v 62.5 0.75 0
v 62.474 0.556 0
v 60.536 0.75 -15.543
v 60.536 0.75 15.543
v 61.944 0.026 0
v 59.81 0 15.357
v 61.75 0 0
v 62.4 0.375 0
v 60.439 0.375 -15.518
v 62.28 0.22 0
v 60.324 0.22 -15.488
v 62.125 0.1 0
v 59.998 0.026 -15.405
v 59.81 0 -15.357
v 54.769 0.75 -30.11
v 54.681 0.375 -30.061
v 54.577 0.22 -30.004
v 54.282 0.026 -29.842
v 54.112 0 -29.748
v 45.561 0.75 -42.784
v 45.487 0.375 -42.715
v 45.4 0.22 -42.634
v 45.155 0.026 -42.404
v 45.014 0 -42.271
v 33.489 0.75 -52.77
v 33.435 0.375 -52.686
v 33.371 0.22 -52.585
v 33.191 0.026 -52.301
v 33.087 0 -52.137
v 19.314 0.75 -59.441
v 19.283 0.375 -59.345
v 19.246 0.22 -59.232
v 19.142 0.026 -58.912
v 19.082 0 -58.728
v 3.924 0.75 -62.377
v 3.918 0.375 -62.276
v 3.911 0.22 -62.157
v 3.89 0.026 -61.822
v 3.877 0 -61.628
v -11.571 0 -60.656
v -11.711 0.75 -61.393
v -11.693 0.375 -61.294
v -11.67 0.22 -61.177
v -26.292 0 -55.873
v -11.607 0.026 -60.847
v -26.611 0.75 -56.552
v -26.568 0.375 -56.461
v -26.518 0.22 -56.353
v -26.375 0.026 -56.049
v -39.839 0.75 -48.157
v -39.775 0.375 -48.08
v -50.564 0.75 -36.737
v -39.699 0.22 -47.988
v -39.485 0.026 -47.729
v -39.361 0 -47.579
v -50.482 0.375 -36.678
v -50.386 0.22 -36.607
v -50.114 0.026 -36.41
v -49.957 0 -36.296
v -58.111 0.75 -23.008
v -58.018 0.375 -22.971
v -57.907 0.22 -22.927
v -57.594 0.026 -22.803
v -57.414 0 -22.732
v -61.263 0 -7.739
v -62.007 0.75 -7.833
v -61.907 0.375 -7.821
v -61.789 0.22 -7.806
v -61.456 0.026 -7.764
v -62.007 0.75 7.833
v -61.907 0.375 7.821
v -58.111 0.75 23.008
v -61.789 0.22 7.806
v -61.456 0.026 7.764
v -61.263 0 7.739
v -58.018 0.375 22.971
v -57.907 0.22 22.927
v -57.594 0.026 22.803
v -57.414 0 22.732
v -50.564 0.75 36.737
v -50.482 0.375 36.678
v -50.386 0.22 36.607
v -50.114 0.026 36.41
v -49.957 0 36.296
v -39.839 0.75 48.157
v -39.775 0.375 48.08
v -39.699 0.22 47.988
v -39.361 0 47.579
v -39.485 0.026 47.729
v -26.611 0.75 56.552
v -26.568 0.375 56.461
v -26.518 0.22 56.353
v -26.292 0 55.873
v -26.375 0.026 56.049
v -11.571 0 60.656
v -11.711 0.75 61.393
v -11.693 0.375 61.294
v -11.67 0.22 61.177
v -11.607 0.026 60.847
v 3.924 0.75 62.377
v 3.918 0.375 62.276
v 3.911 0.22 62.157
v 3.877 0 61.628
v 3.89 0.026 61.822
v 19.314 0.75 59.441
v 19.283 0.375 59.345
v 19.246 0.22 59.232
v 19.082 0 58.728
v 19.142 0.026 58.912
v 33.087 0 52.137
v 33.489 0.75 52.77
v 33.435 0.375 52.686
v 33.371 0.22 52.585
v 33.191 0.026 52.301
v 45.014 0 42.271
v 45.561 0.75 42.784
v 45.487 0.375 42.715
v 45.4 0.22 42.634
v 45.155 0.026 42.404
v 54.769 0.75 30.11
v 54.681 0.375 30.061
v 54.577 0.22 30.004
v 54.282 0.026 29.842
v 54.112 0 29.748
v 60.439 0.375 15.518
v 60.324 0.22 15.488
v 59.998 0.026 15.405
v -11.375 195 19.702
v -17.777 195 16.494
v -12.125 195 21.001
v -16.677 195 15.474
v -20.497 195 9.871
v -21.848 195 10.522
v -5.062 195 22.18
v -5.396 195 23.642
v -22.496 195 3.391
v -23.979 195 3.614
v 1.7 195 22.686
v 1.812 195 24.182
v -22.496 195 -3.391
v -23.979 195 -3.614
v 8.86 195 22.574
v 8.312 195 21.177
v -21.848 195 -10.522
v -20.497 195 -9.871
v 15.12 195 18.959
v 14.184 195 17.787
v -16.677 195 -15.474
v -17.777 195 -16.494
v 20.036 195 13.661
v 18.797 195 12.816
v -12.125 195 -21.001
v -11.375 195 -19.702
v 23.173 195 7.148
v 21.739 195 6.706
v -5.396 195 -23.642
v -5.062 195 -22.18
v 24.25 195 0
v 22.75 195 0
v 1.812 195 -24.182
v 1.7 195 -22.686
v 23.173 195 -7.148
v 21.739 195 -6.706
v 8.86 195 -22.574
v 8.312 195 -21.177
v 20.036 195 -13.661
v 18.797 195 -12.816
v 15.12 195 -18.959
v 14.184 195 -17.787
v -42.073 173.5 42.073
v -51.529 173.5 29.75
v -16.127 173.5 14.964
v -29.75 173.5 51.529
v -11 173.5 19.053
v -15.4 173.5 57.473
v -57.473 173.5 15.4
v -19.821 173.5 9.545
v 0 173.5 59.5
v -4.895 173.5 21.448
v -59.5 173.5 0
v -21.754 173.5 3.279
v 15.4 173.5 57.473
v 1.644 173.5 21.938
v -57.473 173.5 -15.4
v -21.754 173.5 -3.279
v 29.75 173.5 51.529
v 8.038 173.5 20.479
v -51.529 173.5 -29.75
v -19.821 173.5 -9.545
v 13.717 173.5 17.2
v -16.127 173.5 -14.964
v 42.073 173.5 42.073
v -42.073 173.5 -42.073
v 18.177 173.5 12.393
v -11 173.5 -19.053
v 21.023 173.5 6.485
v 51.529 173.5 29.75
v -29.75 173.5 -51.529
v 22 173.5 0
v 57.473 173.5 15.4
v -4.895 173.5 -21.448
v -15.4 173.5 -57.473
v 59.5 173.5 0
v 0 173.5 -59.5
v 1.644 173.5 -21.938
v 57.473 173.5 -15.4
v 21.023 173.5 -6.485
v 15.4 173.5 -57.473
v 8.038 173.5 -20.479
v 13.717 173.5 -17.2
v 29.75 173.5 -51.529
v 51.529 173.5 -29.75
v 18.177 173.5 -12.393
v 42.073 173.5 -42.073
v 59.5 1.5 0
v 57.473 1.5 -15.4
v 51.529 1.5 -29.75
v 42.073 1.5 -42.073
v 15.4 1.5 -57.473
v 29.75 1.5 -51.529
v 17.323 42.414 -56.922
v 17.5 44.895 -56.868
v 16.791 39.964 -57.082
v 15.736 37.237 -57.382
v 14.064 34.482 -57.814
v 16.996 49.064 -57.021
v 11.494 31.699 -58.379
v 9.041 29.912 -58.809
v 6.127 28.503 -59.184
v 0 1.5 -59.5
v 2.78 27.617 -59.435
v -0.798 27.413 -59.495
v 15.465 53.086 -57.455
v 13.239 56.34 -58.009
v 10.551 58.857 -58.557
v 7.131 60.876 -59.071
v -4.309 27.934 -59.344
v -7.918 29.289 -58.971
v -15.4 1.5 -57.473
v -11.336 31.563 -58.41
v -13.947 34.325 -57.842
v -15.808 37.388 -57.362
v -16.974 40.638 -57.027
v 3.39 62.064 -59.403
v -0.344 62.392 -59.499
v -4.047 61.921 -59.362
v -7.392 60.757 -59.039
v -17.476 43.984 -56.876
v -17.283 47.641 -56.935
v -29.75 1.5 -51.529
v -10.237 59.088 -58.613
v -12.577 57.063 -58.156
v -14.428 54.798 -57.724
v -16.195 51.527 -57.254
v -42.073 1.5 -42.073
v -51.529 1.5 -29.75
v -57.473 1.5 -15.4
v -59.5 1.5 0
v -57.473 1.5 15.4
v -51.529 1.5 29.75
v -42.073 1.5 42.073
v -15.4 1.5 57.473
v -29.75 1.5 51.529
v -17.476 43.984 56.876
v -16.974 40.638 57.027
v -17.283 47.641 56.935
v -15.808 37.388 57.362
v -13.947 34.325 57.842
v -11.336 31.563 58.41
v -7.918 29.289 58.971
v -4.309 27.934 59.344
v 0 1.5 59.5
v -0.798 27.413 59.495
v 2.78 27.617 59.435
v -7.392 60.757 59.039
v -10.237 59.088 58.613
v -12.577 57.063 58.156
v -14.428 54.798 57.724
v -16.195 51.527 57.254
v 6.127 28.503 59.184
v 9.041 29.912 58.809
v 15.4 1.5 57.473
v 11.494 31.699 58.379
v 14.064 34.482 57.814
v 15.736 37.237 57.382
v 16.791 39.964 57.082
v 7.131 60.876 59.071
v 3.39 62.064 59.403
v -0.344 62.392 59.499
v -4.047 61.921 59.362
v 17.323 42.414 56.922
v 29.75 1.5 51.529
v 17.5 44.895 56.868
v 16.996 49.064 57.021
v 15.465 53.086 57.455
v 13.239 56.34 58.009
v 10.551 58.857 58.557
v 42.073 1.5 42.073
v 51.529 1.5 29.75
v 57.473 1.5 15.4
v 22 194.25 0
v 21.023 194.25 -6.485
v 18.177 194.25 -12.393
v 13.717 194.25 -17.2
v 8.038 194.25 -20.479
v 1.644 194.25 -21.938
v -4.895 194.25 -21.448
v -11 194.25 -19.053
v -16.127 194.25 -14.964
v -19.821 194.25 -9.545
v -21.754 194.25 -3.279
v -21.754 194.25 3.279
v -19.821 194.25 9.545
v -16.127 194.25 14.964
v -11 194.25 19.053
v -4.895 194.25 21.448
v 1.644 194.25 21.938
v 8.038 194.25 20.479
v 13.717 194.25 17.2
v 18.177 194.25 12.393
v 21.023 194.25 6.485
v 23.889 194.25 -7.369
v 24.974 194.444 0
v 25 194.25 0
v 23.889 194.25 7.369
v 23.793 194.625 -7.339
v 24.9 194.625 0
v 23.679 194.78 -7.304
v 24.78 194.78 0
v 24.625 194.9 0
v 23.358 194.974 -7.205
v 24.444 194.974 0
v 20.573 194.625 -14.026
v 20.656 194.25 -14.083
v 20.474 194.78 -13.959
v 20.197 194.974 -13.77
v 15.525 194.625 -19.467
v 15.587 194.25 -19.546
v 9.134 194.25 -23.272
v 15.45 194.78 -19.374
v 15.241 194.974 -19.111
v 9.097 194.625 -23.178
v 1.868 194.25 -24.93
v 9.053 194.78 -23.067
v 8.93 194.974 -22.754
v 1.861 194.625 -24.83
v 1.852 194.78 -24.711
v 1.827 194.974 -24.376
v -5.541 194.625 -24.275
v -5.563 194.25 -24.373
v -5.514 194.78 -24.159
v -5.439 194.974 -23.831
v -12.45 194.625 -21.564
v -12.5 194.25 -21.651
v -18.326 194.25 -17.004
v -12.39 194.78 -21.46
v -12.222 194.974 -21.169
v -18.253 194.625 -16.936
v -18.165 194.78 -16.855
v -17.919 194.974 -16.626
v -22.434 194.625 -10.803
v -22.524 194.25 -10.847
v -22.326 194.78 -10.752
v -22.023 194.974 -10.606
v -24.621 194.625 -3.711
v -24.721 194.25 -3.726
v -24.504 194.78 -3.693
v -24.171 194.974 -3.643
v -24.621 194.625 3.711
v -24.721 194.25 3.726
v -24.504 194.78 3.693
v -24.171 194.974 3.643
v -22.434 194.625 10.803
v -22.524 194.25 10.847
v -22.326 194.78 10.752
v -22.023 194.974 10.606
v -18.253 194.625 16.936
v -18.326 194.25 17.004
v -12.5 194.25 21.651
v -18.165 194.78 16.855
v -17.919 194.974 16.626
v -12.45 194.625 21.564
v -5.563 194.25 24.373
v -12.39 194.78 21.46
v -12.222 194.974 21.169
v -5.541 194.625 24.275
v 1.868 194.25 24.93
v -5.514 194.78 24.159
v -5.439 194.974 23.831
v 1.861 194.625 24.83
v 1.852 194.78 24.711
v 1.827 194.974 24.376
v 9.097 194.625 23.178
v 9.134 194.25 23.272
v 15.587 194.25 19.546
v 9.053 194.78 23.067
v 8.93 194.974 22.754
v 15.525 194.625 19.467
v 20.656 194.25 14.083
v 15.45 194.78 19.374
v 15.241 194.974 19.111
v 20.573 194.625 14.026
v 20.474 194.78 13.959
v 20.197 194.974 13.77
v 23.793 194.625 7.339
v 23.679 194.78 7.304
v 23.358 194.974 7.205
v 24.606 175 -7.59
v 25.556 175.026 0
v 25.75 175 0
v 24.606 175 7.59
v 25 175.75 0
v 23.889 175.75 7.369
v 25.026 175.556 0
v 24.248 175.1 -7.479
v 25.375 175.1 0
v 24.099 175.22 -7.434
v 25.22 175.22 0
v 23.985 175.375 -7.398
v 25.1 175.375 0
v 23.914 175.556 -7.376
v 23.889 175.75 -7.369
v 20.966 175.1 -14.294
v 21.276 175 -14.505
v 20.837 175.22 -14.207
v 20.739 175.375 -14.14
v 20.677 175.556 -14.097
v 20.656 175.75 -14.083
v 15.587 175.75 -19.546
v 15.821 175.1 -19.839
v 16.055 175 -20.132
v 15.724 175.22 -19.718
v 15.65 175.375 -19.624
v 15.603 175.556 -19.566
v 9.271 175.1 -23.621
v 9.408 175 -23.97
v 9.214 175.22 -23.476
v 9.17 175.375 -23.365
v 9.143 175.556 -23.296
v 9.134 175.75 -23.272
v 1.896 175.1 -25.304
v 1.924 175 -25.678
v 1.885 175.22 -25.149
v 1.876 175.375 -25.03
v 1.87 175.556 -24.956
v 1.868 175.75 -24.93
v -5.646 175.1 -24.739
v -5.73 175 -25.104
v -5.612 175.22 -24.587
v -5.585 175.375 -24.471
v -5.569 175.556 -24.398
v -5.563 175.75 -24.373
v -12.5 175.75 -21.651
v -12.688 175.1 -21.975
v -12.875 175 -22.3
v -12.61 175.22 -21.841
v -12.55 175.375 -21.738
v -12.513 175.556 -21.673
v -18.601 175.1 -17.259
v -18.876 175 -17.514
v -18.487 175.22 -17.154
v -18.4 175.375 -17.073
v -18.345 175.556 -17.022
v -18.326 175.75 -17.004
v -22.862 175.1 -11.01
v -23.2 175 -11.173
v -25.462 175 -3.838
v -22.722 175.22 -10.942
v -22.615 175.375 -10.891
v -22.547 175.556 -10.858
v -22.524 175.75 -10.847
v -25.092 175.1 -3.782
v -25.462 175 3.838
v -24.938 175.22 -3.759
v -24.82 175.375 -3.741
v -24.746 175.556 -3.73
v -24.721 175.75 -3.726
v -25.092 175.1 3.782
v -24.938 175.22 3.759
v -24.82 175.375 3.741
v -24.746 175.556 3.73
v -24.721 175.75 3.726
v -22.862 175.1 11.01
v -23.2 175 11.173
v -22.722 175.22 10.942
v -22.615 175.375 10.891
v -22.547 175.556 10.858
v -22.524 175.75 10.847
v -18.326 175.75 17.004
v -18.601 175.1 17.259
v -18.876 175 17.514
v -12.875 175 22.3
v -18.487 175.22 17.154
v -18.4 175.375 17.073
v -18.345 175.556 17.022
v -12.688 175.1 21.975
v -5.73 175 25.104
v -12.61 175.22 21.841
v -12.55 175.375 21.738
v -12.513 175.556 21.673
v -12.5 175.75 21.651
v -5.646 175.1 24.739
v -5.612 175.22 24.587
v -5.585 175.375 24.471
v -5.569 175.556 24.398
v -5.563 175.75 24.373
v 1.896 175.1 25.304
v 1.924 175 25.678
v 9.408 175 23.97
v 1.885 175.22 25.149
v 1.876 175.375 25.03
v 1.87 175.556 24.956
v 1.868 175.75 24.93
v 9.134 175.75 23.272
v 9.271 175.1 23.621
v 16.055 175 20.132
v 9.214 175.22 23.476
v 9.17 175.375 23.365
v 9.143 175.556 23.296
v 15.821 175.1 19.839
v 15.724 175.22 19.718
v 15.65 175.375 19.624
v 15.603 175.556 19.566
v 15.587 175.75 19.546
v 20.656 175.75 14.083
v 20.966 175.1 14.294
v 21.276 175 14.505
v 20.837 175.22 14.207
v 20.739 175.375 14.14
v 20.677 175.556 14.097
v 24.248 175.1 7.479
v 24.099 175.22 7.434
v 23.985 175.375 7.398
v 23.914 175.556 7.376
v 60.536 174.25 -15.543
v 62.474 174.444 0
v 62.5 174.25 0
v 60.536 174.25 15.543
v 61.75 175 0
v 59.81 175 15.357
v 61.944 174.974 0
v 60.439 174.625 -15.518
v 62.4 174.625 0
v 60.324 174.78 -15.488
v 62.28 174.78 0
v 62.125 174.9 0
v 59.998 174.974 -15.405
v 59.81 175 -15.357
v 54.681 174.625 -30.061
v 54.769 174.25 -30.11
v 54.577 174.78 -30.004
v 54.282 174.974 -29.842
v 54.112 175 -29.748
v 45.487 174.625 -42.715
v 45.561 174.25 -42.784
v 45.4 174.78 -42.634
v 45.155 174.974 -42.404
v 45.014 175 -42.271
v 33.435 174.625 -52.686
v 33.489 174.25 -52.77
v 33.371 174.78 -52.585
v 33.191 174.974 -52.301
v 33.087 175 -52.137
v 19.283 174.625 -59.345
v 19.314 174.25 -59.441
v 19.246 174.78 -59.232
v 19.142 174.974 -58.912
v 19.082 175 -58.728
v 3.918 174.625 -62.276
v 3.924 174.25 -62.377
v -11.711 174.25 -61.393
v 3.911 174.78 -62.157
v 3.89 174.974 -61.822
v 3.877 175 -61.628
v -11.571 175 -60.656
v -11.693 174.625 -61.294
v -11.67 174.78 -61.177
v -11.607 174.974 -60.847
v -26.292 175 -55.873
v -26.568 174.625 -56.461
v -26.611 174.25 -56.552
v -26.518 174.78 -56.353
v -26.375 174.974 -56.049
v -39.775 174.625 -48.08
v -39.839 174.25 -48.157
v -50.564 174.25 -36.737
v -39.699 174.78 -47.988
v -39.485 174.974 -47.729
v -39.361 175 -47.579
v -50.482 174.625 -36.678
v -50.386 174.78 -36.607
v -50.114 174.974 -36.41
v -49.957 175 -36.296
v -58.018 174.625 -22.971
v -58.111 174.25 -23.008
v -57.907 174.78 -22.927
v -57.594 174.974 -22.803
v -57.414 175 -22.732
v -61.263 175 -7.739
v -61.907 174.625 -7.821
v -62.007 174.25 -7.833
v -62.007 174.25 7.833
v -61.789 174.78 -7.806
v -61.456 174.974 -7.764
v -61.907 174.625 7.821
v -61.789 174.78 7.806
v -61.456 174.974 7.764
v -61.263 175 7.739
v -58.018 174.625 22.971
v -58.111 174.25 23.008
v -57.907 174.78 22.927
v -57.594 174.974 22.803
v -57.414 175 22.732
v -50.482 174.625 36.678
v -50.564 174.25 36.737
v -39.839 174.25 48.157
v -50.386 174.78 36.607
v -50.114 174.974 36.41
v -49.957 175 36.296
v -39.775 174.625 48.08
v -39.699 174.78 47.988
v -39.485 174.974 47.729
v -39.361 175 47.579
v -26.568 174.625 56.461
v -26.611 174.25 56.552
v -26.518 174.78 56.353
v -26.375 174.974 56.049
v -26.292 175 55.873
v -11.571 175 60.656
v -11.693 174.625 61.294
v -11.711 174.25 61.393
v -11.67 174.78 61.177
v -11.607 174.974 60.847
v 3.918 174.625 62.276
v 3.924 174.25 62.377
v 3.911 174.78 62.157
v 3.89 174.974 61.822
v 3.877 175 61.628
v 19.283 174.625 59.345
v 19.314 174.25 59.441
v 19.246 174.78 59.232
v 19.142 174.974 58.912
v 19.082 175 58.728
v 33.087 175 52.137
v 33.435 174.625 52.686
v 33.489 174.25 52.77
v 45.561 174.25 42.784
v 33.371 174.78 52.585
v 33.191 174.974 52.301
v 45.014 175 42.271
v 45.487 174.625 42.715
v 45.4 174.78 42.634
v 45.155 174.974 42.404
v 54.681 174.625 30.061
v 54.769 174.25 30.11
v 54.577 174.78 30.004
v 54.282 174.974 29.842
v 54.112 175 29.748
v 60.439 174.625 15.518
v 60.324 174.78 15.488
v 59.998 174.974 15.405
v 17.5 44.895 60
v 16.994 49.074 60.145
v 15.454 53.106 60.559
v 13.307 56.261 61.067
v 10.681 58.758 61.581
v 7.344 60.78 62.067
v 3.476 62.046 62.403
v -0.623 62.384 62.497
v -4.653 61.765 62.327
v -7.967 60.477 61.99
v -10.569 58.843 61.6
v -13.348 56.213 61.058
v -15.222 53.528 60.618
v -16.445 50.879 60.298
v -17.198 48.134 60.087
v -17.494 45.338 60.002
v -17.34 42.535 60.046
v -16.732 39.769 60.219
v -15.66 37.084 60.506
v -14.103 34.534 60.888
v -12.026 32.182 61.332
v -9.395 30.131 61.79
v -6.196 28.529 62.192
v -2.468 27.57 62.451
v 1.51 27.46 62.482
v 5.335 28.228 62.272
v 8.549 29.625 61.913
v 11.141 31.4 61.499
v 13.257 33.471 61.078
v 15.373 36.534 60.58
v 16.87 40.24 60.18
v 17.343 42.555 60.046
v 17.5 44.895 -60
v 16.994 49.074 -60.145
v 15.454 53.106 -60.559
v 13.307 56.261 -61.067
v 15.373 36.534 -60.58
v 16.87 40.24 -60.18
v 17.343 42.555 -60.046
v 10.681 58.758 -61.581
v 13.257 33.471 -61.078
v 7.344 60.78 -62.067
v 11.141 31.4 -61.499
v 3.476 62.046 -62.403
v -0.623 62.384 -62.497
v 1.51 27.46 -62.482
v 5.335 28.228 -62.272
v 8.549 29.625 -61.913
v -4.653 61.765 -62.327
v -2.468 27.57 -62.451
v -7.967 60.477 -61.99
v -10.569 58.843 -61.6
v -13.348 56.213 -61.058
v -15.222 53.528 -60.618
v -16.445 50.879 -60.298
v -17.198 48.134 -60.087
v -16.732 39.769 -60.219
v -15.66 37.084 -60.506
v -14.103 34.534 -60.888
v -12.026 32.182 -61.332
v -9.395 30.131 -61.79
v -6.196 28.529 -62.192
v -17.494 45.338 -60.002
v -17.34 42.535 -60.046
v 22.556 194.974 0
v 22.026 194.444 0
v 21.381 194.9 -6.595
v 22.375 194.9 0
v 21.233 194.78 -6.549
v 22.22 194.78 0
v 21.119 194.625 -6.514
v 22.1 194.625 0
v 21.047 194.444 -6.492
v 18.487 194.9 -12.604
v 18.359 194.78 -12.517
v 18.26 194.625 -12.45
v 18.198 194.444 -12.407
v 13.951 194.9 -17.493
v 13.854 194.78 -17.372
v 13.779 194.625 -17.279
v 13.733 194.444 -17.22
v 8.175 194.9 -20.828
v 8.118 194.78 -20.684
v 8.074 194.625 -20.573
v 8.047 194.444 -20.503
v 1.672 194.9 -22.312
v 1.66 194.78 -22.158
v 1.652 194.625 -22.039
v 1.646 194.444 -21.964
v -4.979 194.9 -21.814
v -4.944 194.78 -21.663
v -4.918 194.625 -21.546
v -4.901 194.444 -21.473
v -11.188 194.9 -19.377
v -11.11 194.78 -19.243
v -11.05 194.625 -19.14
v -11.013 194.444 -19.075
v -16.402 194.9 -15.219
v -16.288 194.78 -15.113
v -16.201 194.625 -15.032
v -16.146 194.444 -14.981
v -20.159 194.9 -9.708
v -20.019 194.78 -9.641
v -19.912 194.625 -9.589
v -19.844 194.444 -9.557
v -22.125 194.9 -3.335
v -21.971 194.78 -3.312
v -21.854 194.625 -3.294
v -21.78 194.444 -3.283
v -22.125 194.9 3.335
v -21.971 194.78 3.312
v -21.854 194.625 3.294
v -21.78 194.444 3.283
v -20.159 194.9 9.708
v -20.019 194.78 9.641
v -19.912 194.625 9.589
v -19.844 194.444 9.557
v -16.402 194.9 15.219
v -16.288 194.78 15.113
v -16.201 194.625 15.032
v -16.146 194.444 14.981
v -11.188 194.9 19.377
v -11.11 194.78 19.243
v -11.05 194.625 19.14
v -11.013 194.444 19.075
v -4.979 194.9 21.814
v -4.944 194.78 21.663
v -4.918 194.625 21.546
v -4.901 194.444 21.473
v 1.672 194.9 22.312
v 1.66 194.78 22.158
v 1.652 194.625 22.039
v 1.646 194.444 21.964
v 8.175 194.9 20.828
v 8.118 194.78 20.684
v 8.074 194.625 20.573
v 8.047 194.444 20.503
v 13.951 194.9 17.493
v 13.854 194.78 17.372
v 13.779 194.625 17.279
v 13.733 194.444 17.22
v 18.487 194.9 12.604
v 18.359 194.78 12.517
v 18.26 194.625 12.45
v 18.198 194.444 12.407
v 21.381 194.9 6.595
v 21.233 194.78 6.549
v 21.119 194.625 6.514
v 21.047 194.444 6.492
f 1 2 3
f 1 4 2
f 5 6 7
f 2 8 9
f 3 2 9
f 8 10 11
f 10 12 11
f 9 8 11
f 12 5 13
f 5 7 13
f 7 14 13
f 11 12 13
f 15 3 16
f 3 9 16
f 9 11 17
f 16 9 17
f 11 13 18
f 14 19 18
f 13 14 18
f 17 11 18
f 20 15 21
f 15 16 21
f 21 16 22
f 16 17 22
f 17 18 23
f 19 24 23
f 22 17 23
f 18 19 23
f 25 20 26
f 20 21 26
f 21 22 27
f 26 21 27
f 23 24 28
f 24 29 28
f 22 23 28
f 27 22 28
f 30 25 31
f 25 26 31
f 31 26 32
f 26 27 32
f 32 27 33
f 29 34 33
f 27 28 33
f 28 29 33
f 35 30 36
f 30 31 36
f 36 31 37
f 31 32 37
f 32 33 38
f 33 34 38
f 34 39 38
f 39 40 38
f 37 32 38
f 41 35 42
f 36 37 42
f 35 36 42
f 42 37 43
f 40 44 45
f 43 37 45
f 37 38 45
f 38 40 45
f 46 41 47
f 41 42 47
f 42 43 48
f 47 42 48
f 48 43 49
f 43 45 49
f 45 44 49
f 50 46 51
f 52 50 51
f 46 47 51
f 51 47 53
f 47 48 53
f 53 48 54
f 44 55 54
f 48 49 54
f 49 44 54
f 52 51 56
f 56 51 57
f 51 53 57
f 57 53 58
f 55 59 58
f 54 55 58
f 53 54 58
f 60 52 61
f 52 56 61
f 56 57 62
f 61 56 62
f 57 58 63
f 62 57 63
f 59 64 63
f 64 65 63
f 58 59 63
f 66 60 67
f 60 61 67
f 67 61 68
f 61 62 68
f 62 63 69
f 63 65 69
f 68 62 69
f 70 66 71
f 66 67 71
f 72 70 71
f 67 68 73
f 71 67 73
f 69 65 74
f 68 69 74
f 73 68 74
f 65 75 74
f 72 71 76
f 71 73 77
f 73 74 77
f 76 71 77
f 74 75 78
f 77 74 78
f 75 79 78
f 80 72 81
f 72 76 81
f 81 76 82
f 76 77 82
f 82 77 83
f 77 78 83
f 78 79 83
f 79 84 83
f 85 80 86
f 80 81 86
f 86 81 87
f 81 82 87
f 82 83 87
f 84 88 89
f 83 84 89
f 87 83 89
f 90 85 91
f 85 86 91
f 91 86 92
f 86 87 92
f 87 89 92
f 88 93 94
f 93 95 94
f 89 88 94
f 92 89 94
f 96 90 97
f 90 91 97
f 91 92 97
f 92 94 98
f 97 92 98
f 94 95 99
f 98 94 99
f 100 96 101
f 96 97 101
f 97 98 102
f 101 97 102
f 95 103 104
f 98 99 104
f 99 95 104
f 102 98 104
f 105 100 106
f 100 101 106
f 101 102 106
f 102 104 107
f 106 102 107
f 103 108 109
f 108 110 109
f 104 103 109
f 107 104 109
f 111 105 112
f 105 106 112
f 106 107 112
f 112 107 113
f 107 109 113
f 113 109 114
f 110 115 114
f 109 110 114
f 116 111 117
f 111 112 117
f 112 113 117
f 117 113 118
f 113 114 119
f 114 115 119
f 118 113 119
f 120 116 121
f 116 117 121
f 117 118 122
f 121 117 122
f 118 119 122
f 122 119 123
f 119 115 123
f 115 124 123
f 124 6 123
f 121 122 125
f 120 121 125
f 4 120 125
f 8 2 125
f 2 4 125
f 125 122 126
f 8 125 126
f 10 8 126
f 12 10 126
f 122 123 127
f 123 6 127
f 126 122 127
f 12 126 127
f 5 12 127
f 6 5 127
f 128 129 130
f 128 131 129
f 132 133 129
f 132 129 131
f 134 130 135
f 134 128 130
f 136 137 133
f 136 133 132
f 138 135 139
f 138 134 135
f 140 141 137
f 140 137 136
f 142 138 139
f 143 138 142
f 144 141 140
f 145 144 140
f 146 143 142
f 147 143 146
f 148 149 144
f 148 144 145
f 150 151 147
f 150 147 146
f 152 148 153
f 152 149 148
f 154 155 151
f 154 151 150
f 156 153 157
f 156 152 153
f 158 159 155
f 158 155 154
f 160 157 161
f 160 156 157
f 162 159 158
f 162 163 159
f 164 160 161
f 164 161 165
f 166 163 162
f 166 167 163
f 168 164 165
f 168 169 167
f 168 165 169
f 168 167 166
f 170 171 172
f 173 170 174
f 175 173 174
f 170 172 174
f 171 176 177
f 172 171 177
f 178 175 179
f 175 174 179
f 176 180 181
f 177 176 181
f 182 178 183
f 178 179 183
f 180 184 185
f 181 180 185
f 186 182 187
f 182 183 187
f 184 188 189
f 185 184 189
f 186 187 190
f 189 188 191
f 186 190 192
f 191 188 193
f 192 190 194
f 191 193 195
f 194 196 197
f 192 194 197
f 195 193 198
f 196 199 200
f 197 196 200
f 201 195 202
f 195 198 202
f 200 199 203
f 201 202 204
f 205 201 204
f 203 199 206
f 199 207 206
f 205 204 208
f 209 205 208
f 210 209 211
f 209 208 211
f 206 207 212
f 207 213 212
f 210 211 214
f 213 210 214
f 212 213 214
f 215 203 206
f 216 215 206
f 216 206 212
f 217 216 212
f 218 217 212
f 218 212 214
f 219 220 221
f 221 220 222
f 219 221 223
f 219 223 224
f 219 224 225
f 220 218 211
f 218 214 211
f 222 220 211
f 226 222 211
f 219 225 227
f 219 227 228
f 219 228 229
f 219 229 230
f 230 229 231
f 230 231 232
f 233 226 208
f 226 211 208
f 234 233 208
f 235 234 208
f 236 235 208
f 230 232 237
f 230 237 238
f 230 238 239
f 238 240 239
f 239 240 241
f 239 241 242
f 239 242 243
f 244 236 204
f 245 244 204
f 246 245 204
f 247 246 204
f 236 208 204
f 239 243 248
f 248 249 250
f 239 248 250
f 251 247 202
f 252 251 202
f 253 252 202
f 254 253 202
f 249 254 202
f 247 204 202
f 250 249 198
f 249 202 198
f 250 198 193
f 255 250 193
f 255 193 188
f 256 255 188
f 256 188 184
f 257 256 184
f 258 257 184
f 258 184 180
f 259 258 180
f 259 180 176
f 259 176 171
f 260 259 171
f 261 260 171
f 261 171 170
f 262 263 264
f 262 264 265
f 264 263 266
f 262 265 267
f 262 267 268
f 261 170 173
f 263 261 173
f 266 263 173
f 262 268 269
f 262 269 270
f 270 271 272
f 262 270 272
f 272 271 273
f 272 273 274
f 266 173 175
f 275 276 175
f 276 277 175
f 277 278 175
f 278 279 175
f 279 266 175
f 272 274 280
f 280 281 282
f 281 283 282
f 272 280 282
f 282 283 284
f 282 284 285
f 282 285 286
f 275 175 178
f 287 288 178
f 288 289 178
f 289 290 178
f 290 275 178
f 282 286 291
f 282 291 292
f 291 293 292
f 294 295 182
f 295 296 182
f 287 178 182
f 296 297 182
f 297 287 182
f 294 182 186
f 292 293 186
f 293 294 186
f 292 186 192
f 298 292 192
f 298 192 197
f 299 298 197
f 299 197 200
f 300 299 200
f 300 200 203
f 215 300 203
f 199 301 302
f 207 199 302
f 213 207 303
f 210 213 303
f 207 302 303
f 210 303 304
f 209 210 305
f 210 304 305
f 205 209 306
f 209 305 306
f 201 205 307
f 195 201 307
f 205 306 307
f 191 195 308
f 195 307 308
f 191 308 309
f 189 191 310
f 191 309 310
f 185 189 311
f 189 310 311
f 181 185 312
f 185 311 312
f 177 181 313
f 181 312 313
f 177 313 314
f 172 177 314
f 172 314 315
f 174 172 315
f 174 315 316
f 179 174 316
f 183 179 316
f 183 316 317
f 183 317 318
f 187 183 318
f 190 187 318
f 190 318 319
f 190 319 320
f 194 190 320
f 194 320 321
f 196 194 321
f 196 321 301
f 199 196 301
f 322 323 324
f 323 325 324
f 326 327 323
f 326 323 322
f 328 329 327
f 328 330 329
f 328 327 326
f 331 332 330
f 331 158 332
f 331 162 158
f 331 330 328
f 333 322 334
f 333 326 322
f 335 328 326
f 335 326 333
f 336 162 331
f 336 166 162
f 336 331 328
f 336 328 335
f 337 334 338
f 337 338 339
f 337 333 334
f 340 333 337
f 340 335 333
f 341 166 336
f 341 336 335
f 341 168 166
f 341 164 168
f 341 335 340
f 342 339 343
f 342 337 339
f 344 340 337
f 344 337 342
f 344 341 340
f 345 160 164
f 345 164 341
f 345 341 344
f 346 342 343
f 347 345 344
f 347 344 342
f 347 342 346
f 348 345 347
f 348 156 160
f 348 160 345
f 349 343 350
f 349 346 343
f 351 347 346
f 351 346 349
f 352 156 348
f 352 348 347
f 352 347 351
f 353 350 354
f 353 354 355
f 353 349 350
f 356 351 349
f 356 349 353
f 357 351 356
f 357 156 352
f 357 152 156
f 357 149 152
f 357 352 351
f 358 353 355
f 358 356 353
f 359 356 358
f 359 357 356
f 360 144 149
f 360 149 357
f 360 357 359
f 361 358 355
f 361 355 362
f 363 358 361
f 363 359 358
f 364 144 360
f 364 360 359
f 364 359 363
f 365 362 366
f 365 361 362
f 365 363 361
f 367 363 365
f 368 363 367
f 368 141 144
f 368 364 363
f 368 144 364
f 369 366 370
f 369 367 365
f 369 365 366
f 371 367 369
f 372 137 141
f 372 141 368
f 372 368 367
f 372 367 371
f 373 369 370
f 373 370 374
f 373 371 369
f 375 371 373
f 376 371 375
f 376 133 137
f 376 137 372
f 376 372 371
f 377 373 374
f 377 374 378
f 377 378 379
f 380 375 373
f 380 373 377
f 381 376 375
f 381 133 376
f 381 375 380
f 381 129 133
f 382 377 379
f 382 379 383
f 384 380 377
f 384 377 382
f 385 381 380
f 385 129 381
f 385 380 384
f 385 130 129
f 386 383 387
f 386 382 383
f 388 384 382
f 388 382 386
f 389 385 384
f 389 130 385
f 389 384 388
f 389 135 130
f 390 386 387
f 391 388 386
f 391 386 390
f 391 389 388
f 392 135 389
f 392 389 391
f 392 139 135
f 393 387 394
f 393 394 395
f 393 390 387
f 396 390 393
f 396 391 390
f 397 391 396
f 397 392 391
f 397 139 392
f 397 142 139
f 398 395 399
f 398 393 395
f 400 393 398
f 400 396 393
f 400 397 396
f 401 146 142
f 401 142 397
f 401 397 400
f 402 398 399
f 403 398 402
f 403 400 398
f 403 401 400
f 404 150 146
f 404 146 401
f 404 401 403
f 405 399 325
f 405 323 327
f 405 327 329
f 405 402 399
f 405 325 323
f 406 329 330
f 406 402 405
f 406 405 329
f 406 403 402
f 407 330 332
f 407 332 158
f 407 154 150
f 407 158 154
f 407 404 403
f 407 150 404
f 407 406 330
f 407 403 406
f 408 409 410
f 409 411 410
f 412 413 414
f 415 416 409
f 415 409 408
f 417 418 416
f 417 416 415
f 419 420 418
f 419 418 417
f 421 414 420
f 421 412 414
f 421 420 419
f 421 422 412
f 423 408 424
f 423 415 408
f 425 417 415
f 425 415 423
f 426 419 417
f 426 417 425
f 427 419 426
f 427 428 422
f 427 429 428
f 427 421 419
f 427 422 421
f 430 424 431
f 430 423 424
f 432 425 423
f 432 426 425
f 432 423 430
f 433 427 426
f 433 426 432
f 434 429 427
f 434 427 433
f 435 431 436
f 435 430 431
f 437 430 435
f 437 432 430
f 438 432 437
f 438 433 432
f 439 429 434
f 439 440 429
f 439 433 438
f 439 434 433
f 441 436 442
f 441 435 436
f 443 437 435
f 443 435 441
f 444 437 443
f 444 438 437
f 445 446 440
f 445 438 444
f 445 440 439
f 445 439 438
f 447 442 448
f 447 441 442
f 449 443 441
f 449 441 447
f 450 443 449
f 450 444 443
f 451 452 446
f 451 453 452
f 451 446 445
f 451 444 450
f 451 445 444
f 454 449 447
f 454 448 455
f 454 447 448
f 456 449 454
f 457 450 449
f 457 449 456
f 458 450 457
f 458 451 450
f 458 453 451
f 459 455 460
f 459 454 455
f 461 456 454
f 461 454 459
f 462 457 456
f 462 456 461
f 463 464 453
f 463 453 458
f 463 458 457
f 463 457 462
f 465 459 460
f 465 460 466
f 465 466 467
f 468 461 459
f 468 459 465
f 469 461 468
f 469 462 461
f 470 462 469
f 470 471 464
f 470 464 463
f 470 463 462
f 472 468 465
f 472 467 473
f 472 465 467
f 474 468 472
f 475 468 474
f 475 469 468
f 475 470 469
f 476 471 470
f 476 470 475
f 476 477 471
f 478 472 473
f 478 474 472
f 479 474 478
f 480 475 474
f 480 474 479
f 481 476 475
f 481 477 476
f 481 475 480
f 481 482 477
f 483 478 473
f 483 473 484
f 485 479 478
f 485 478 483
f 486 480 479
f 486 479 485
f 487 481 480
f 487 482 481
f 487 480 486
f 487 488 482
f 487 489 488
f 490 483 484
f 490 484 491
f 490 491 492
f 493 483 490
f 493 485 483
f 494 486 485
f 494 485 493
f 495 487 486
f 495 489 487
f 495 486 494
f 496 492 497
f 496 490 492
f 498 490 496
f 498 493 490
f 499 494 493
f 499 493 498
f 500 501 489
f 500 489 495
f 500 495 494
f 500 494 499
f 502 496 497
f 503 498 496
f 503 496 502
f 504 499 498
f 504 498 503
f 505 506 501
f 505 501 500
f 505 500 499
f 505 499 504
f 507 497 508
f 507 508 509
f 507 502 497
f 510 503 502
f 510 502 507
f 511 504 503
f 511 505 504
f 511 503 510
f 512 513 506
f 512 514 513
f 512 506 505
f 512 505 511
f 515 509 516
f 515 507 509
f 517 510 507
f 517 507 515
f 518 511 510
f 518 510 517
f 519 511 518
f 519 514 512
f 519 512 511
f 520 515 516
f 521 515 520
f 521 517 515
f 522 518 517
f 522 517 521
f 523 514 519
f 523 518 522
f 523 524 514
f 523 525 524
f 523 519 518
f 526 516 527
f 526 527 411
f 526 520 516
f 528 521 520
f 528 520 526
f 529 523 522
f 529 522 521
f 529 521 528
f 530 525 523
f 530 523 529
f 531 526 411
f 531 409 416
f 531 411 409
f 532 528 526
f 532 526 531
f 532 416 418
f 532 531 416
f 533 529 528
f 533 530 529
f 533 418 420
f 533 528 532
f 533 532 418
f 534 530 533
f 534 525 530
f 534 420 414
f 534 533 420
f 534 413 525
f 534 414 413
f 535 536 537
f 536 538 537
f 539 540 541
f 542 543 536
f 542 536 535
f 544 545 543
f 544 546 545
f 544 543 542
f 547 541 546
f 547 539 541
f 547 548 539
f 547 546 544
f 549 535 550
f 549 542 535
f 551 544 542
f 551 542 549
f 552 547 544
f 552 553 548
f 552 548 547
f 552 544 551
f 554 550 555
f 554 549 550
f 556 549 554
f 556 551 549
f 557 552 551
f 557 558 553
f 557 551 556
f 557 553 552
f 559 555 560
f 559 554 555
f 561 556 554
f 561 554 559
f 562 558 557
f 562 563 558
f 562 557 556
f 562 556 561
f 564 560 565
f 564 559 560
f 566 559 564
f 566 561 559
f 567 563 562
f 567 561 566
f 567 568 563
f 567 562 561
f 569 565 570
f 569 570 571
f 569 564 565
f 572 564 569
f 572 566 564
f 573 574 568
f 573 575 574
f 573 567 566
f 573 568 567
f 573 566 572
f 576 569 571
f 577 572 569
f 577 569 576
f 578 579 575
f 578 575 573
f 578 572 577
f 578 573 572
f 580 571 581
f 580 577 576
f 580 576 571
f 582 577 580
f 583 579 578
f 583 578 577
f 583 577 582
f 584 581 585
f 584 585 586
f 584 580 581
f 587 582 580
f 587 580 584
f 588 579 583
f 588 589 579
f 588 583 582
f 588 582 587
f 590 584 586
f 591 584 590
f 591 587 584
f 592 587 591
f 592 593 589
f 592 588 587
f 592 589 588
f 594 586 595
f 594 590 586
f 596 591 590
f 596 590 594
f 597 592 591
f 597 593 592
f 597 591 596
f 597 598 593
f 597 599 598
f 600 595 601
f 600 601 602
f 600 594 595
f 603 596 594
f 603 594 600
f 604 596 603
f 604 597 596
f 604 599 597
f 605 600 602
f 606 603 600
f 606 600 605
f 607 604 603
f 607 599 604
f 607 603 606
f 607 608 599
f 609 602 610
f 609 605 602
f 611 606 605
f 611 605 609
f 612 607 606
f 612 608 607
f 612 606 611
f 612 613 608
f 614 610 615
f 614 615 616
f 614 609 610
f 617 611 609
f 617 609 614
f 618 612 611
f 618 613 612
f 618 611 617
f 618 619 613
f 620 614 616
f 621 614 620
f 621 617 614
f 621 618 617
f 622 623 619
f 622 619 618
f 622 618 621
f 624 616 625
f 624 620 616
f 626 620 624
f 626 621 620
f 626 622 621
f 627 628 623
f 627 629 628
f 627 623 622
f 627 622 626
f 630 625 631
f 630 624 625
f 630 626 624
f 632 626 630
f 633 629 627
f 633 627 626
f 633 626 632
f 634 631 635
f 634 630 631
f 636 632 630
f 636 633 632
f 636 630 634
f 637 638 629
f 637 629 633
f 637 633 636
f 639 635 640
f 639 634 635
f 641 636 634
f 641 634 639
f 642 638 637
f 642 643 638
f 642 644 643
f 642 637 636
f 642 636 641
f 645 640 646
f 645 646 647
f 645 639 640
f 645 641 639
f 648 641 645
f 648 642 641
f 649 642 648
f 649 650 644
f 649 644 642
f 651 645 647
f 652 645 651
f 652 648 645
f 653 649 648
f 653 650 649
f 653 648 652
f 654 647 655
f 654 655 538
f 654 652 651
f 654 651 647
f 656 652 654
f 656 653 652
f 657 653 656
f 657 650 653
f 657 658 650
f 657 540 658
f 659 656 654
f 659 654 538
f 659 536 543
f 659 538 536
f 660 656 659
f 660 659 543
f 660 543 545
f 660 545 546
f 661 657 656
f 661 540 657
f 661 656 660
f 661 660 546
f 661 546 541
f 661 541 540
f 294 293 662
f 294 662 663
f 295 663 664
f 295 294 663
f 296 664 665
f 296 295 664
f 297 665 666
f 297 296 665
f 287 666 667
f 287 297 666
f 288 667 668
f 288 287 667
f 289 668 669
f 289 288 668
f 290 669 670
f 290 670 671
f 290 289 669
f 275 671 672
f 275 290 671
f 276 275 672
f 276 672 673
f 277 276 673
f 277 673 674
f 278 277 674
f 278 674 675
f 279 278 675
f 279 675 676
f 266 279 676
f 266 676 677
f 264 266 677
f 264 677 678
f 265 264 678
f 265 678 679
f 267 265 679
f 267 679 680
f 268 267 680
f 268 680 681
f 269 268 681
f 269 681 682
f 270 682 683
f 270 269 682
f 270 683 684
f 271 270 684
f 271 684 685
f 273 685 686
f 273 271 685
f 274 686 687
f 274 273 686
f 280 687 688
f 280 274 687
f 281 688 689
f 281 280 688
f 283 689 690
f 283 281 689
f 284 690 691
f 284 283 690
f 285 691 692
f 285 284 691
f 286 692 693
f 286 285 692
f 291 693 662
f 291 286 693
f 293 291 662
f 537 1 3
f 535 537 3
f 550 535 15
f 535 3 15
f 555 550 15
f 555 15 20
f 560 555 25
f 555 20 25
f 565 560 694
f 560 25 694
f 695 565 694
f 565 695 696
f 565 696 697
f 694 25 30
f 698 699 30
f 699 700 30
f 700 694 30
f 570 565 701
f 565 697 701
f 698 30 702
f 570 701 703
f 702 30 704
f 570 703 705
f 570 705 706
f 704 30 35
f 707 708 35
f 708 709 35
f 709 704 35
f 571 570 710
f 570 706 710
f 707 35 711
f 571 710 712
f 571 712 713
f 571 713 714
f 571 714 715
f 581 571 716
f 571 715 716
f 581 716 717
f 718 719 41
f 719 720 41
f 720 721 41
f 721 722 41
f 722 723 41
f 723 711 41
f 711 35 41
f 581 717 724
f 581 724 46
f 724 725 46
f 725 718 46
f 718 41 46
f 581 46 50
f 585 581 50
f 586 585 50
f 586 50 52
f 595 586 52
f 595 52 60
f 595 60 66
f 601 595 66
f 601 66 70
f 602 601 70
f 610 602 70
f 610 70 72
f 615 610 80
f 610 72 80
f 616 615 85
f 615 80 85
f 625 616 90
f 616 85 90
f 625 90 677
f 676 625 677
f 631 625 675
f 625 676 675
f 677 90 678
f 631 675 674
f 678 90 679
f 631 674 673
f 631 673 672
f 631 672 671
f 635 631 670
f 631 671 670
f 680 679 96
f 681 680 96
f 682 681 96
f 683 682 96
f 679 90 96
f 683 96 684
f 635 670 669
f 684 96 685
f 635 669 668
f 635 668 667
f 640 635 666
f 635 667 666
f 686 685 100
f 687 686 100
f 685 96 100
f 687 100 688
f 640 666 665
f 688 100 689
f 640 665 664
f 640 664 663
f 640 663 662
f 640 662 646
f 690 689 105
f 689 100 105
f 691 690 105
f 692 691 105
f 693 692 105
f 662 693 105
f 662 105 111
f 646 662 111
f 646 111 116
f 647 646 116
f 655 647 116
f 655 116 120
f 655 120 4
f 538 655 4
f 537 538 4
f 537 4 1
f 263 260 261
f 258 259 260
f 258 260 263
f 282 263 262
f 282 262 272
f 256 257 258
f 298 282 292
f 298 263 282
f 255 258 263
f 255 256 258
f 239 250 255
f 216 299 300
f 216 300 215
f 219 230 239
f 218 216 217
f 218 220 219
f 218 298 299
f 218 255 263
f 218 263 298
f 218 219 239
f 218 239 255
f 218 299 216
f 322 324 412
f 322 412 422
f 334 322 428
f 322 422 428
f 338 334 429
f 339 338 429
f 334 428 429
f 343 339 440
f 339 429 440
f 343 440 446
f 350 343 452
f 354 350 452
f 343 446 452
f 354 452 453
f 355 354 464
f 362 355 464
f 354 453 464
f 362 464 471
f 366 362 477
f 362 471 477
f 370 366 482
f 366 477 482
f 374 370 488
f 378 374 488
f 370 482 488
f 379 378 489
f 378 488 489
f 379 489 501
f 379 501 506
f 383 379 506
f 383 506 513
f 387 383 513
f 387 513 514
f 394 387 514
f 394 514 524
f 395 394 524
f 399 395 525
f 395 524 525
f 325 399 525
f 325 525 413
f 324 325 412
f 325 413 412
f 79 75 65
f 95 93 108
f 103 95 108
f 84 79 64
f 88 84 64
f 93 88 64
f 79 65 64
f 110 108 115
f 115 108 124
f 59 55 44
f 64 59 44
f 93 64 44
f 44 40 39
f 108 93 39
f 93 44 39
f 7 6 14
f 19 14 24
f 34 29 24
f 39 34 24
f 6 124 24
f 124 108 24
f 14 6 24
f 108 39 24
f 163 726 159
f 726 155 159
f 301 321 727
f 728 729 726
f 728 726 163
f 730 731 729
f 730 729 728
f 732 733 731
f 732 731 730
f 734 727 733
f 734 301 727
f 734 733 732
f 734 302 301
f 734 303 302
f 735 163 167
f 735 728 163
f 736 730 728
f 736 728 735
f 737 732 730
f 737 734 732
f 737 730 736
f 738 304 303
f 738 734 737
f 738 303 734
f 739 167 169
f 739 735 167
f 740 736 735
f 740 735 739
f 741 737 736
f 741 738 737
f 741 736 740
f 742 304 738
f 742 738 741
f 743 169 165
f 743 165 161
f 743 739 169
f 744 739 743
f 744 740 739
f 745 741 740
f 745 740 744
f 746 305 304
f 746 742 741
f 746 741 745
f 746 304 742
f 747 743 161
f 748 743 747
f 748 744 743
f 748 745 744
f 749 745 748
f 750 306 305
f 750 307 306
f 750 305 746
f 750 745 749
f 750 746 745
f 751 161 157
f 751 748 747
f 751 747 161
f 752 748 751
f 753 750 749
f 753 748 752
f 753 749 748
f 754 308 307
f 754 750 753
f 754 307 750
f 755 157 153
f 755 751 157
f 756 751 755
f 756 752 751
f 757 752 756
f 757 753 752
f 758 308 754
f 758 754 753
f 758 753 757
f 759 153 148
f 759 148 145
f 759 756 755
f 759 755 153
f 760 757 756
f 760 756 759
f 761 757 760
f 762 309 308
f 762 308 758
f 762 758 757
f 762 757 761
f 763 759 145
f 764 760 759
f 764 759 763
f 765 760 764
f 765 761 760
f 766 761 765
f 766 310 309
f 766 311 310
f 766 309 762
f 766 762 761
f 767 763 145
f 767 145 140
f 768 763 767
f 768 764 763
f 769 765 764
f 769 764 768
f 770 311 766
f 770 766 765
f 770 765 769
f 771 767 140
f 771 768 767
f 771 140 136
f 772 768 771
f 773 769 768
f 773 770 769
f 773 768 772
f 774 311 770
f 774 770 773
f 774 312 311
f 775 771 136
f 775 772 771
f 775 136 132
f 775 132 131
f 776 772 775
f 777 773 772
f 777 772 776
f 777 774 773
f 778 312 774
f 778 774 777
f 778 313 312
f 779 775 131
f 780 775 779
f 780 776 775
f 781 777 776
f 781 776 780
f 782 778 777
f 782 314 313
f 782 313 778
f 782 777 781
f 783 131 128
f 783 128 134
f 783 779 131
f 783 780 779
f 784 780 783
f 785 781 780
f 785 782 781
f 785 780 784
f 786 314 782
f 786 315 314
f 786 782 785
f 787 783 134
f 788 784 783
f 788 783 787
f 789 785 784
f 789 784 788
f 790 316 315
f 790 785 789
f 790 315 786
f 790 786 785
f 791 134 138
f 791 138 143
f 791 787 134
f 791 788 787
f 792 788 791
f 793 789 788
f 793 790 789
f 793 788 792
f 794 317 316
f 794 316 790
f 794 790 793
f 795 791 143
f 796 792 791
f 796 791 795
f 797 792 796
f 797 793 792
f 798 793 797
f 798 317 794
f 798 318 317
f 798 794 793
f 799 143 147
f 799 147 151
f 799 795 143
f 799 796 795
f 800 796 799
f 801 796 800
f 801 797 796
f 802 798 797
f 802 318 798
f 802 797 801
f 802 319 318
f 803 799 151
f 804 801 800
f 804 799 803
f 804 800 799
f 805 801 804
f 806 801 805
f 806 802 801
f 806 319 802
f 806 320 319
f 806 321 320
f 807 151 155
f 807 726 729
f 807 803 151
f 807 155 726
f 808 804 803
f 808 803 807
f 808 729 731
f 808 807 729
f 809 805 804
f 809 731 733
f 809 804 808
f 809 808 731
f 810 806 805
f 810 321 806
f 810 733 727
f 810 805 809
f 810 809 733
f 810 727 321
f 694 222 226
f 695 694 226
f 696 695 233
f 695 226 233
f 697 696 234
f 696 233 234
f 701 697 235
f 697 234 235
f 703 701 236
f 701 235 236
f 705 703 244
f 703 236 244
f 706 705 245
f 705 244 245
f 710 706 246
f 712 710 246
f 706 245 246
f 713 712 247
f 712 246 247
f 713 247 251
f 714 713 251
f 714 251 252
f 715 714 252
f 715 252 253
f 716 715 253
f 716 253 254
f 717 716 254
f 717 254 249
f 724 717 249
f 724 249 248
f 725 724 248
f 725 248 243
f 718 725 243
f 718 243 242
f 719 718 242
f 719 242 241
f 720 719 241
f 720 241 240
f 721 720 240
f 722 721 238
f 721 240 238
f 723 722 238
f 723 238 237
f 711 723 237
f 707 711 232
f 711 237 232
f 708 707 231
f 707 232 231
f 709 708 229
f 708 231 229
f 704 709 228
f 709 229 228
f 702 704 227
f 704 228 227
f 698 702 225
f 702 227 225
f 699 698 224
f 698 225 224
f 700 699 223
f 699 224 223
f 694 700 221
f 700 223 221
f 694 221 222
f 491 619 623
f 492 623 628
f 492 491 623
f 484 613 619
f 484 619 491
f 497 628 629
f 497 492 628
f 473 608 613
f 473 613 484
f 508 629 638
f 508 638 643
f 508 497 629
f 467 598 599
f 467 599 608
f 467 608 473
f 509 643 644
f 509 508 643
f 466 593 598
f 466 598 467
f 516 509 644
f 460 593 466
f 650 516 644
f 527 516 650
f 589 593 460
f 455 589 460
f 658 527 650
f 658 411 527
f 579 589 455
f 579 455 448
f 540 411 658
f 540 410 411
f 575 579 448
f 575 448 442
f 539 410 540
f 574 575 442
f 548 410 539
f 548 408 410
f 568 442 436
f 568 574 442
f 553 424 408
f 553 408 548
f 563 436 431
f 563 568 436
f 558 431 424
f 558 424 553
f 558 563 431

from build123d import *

# Parameters (mm, degrees)
SKETCH1_R               = 62.5
BOSS_EXTRUDE1_DEPTH     = 175
CUT_EXTRUDE1_START      = -1.5
SKETCH2_R               = 59.5
CUT_EXTRUDE1_DEPTH      = 172
SKETCH3_R               = 25
BOSS_EXTRUDE2_DEPTH     = 20
SKETCH4_R               = 22
CUT_EXTRUDE2_DEPTH      = 30
FILLET1_R               = 0.75
SKETCH5_R               = 17.5
CUT_EXTRUDE3_DEPTH      = 63.5000001
CUT_EXTRUDE3_DEPTH_BACK = 70


with BuildPart() as part:
    # Sketch1 → Boss-Extrude1 (new body)
    with BuildSketch(Plane(origin=(0, 0, 0), x_dir=(1, 0, 0), z_dir=(0, 1, 0))):
        Circle(SKETCH1_R)
    extrude(amount=BOSS_EXTRUDE1_DEPTH)

    # Sketch2 → Cut-Extrude1 (cut)
    with BuildSketch(Plane(origin=(0, 175, 0), x_dir=(1, 0, 0), z_dir=(0, 1, 0)).offset(CUT_EXTRUDE1_START)):
        Circle(SKETCH2_R)
    extrude(amount=-CUT_EXTRUDE1_DEPTH, mode=Mode.SUBTRACT)

    # Sketch3 → Boss-Extrude2 (add)
    with BuildSketch(Plane(origin=(0, 175, 0), x_dir=(1, 0, 0), z_dir=(0, 1, 0))):
        Circle(SKETCH3_R)
    extrude(amount=BOSS_EXTRUDE2_DEPTH)

    # Sketch4 → Cut-Extrude2 (cut)
    with BuildSketch(Plane(origin=(0, 195, 0), x_dir=(1, 0, 0), z_dir=(0, 1, 0))):
        Circle(SKETCH4_R)
    extrude(amount=-CUT_EXTRUDE2_DEPTH, mode=Mode.SUBTRACT)

    # Fillet1
    fillet1_edges = [part.edges().sort_by_distance(p)[0] for p in [
        (-25, 175, 0),
        (-25, 195, 0),
        (-22, 195, 0),
        (-62.5, 0, 0),
        (-62.5, 175, 0),
    ]]
    fillet(fillet1_edges, radius=FILLET1_R)

    # Sketch5 → Cut-Extrude3 (cut, two sides)
    with BuildSketch(Plane.XY) as cut_extrude3_sk:
        with Locations((0, 44.895186866)):
            Circle(SKETCH5_R)
    extrude(amount=CUT_EXTRUDE3_DEPTH, mode=Mode.SUBTRACT)
    extrude(cut_extrude3_sk.sketch, amount=-CUT_EXTRUDE3_DEPTH_BACK, mode=Mode.SUBTRACT)


solid = part.part
